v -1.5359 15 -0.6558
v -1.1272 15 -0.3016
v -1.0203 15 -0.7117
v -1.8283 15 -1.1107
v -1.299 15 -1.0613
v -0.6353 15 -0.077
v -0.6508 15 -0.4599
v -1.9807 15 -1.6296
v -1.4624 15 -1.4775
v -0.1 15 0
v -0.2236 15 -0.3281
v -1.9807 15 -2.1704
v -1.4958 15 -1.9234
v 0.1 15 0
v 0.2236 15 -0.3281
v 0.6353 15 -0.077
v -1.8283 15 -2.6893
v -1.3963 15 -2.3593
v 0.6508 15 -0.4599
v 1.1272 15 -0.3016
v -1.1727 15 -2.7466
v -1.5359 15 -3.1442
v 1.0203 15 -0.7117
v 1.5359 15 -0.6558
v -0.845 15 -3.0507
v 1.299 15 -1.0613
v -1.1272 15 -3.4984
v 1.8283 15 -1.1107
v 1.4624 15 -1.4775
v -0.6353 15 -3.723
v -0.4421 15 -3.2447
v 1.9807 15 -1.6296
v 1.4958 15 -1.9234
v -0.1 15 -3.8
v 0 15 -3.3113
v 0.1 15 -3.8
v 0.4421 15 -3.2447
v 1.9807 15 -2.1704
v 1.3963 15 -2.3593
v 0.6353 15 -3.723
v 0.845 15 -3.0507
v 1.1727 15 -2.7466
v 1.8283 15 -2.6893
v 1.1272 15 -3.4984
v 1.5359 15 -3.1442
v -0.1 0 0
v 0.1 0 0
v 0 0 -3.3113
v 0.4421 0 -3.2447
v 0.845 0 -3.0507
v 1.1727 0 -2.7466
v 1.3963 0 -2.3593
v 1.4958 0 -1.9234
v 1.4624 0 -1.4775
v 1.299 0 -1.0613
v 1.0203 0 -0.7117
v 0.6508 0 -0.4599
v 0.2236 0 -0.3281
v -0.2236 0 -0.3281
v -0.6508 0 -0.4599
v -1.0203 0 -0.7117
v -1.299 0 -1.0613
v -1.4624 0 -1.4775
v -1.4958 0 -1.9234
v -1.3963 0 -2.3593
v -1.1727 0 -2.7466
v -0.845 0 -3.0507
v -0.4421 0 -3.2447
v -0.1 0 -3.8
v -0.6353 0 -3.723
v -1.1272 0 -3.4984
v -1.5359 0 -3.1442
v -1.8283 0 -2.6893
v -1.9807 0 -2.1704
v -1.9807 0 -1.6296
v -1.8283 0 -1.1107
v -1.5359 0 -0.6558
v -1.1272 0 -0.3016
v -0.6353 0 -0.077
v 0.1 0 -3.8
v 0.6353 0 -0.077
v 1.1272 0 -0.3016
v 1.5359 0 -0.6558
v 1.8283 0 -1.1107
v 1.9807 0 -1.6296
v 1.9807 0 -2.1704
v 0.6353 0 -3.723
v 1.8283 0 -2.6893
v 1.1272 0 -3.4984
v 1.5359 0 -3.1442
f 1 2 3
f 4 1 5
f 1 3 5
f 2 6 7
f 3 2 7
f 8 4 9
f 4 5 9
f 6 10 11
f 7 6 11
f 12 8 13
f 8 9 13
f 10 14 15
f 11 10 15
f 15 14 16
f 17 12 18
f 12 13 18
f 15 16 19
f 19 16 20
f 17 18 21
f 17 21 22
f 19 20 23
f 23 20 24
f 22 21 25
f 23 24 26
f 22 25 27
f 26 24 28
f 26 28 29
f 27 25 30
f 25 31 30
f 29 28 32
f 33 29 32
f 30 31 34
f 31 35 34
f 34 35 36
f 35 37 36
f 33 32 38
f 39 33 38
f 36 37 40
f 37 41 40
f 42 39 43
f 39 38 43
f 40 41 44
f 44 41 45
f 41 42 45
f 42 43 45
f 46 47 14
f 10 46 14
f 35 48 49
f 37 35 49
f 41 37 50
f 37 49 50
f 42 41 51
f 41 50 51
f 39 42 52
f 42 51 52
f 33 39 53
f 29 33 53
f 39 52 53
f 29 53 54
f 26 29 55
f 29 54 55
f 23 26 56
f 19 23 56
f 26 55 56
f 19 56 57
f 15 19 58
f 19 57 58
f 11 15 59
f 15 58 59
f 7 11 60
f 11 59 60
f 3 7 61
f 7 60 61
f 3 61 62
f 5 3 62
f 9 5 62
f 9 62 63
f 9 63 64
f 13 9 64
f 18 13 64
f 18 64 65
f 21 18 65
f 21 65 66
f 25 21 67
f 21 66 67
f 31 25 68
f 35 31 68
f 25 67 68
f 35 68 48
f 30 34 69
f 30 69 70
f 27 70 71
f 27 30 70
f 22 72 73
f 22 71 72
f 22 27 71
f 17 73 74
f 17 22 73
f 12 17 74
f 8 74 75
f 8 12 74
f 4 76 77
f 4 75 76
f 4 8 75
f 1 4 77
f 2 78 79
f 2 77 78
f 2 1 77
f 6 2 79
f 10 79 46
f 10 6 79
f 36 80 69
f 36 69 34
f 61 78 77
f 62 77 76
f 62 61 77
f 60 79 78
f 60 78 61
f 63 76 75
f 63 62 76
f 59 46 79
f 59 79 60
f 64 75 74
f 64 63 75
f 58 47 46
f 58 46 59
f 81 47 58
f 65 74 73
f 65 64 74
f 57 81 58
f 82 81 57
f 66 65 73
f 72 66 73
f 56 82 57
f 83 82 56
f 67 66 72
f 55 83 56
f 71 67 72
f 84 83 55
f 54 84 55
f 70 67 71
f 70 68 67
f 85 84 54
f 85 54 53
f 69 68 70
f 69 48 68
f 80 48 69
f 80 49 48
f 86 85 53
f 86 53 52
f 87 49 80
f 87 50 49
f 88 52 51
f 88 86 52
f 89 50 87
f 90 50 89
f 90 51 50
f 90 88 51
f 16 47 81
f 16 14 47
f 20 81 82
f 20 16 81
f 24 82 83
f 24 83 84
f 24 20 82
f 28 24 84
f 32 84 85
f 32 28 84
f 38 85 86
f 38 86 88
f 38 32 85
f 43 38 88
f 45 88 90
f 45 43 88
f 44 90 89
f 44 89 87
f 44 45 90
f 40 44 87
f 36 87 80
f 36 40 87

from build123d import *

# Parameters (mm, degrees)
SKETCH1_W                   = 3.8
SKETCH1_H                   = 15
BOSS_EXTRUDE1_DEPTH         = 2
FILLET1_RADIUS              = 1.9
FILLET1_LENGTH              = 15
FILLET1_OF_MIRROR1_2_RADIUS = 1.9
FILLET1_OF_MIRROR1_2_LENGTH = 15
SKETCH3_R                   = 1.5
CUT_EXTRUDE1_DEPTH          = 15


with BuildPart() as part:
    # Sketch1 → Boss-Extrude1 (new body)
    with BuildSketch(Plane(origin=(0, 0, 0), x_dir=(0, 0, -1), z_dir=(1, 0, 0))):
        with Locations((1.9, 7.5)):
            Rectangle(SKETCH1_W, SKETCH1_H)
    boss_extrude1 = extrude(amount=BOSS_EXTRUDE1_DEPTH)

    # Fillet1: full round fillet: the end face becomes a half cylinder, R = half its width
    fillet1_face = Plane((2, 7.5, -1.9), x_dir=(0, 1, 0), z_dir=(1, 0, 0))  # on the end face: x along it, z out of the body
    fillet1_slab = fillet1_face.offset(-FILLET1_RADIUS / 2) * Box(FILLET1_LENGTH, 2 * FILLET1_RADIUS, FILLET1_RADIUS, mode=Mode.PRIVATE)  # the body's end, R deep
    fillet1_round = Plane((0.1, 7.5, -1.9), x_dir=(1, 0, 0), z_dir=(0, 1, 0)) * Cylinder(FILLET1_RADIUS, FILLET1_LENGTH, mode=Mode.PRIVATE)  # its axis R under the face
    add(fillet1_slab - fillet1_round, mode=Mode.SUBTRACT)

    # Mirror1: Boss-Extrude1 across plane
    add(boss_extrude1.mirror(Plane.ZY))

    # Fillet1 of Mirror1 2: full round fillet: the end face becomes a half cylinder, R = half its width
    fillet1_of_mirror1_2_face = Plane((-2, 7.5, -1.9), x_dir=(0, 1, 0), z_dir=(-1, 0, 0))  # on the end face: x along it, z out of the body
    fillet1_of_mirror1_2_slab = fillet1_of_mirror1_2_face.offset(-FILLET1_OF_MIRROR1_2_RADIUS / 2) * Box(FILLET1_OF_MIRROR1_2_LENGTH, 2 * FILLET1_OF_MIRROR1_2_RADIUS, FILLET1_OF_MIRROR1_2_RADIUS, mode=Mode.PRIVATE)  # the body's end, R deep
    fillet1_of_mirror1_2_round = Plane((-0.1, 7.5, -1.9), x_dir=(-1, 0, 0), z_dir=(0, 1, 0)) * Cylinder(FILLET1_OF_MIRROR1_2_RADIUS, FILLET1_OF_MIRROR1_2_LENGTH, mode=Mode.PRIVATE)  # its axis R under the face
    add(fillet1_of_mirror1_2_slab - fillet1_of_mirror1_2_round, mode=Mode.SUBTRACT)

    # Sketch3 → Cut-Extrude1 (cut)
    with BuildSketch(Plane.XZ):
        with Locations(Location((0, -1.811318553, 0), (0, 0, 270))):
            Circle(SKETCH3_R)
    extrude(amount=-CUT_EXTRUDE1_DEPTH, mode=Mode.SUBTRACT)


solid = part.part
